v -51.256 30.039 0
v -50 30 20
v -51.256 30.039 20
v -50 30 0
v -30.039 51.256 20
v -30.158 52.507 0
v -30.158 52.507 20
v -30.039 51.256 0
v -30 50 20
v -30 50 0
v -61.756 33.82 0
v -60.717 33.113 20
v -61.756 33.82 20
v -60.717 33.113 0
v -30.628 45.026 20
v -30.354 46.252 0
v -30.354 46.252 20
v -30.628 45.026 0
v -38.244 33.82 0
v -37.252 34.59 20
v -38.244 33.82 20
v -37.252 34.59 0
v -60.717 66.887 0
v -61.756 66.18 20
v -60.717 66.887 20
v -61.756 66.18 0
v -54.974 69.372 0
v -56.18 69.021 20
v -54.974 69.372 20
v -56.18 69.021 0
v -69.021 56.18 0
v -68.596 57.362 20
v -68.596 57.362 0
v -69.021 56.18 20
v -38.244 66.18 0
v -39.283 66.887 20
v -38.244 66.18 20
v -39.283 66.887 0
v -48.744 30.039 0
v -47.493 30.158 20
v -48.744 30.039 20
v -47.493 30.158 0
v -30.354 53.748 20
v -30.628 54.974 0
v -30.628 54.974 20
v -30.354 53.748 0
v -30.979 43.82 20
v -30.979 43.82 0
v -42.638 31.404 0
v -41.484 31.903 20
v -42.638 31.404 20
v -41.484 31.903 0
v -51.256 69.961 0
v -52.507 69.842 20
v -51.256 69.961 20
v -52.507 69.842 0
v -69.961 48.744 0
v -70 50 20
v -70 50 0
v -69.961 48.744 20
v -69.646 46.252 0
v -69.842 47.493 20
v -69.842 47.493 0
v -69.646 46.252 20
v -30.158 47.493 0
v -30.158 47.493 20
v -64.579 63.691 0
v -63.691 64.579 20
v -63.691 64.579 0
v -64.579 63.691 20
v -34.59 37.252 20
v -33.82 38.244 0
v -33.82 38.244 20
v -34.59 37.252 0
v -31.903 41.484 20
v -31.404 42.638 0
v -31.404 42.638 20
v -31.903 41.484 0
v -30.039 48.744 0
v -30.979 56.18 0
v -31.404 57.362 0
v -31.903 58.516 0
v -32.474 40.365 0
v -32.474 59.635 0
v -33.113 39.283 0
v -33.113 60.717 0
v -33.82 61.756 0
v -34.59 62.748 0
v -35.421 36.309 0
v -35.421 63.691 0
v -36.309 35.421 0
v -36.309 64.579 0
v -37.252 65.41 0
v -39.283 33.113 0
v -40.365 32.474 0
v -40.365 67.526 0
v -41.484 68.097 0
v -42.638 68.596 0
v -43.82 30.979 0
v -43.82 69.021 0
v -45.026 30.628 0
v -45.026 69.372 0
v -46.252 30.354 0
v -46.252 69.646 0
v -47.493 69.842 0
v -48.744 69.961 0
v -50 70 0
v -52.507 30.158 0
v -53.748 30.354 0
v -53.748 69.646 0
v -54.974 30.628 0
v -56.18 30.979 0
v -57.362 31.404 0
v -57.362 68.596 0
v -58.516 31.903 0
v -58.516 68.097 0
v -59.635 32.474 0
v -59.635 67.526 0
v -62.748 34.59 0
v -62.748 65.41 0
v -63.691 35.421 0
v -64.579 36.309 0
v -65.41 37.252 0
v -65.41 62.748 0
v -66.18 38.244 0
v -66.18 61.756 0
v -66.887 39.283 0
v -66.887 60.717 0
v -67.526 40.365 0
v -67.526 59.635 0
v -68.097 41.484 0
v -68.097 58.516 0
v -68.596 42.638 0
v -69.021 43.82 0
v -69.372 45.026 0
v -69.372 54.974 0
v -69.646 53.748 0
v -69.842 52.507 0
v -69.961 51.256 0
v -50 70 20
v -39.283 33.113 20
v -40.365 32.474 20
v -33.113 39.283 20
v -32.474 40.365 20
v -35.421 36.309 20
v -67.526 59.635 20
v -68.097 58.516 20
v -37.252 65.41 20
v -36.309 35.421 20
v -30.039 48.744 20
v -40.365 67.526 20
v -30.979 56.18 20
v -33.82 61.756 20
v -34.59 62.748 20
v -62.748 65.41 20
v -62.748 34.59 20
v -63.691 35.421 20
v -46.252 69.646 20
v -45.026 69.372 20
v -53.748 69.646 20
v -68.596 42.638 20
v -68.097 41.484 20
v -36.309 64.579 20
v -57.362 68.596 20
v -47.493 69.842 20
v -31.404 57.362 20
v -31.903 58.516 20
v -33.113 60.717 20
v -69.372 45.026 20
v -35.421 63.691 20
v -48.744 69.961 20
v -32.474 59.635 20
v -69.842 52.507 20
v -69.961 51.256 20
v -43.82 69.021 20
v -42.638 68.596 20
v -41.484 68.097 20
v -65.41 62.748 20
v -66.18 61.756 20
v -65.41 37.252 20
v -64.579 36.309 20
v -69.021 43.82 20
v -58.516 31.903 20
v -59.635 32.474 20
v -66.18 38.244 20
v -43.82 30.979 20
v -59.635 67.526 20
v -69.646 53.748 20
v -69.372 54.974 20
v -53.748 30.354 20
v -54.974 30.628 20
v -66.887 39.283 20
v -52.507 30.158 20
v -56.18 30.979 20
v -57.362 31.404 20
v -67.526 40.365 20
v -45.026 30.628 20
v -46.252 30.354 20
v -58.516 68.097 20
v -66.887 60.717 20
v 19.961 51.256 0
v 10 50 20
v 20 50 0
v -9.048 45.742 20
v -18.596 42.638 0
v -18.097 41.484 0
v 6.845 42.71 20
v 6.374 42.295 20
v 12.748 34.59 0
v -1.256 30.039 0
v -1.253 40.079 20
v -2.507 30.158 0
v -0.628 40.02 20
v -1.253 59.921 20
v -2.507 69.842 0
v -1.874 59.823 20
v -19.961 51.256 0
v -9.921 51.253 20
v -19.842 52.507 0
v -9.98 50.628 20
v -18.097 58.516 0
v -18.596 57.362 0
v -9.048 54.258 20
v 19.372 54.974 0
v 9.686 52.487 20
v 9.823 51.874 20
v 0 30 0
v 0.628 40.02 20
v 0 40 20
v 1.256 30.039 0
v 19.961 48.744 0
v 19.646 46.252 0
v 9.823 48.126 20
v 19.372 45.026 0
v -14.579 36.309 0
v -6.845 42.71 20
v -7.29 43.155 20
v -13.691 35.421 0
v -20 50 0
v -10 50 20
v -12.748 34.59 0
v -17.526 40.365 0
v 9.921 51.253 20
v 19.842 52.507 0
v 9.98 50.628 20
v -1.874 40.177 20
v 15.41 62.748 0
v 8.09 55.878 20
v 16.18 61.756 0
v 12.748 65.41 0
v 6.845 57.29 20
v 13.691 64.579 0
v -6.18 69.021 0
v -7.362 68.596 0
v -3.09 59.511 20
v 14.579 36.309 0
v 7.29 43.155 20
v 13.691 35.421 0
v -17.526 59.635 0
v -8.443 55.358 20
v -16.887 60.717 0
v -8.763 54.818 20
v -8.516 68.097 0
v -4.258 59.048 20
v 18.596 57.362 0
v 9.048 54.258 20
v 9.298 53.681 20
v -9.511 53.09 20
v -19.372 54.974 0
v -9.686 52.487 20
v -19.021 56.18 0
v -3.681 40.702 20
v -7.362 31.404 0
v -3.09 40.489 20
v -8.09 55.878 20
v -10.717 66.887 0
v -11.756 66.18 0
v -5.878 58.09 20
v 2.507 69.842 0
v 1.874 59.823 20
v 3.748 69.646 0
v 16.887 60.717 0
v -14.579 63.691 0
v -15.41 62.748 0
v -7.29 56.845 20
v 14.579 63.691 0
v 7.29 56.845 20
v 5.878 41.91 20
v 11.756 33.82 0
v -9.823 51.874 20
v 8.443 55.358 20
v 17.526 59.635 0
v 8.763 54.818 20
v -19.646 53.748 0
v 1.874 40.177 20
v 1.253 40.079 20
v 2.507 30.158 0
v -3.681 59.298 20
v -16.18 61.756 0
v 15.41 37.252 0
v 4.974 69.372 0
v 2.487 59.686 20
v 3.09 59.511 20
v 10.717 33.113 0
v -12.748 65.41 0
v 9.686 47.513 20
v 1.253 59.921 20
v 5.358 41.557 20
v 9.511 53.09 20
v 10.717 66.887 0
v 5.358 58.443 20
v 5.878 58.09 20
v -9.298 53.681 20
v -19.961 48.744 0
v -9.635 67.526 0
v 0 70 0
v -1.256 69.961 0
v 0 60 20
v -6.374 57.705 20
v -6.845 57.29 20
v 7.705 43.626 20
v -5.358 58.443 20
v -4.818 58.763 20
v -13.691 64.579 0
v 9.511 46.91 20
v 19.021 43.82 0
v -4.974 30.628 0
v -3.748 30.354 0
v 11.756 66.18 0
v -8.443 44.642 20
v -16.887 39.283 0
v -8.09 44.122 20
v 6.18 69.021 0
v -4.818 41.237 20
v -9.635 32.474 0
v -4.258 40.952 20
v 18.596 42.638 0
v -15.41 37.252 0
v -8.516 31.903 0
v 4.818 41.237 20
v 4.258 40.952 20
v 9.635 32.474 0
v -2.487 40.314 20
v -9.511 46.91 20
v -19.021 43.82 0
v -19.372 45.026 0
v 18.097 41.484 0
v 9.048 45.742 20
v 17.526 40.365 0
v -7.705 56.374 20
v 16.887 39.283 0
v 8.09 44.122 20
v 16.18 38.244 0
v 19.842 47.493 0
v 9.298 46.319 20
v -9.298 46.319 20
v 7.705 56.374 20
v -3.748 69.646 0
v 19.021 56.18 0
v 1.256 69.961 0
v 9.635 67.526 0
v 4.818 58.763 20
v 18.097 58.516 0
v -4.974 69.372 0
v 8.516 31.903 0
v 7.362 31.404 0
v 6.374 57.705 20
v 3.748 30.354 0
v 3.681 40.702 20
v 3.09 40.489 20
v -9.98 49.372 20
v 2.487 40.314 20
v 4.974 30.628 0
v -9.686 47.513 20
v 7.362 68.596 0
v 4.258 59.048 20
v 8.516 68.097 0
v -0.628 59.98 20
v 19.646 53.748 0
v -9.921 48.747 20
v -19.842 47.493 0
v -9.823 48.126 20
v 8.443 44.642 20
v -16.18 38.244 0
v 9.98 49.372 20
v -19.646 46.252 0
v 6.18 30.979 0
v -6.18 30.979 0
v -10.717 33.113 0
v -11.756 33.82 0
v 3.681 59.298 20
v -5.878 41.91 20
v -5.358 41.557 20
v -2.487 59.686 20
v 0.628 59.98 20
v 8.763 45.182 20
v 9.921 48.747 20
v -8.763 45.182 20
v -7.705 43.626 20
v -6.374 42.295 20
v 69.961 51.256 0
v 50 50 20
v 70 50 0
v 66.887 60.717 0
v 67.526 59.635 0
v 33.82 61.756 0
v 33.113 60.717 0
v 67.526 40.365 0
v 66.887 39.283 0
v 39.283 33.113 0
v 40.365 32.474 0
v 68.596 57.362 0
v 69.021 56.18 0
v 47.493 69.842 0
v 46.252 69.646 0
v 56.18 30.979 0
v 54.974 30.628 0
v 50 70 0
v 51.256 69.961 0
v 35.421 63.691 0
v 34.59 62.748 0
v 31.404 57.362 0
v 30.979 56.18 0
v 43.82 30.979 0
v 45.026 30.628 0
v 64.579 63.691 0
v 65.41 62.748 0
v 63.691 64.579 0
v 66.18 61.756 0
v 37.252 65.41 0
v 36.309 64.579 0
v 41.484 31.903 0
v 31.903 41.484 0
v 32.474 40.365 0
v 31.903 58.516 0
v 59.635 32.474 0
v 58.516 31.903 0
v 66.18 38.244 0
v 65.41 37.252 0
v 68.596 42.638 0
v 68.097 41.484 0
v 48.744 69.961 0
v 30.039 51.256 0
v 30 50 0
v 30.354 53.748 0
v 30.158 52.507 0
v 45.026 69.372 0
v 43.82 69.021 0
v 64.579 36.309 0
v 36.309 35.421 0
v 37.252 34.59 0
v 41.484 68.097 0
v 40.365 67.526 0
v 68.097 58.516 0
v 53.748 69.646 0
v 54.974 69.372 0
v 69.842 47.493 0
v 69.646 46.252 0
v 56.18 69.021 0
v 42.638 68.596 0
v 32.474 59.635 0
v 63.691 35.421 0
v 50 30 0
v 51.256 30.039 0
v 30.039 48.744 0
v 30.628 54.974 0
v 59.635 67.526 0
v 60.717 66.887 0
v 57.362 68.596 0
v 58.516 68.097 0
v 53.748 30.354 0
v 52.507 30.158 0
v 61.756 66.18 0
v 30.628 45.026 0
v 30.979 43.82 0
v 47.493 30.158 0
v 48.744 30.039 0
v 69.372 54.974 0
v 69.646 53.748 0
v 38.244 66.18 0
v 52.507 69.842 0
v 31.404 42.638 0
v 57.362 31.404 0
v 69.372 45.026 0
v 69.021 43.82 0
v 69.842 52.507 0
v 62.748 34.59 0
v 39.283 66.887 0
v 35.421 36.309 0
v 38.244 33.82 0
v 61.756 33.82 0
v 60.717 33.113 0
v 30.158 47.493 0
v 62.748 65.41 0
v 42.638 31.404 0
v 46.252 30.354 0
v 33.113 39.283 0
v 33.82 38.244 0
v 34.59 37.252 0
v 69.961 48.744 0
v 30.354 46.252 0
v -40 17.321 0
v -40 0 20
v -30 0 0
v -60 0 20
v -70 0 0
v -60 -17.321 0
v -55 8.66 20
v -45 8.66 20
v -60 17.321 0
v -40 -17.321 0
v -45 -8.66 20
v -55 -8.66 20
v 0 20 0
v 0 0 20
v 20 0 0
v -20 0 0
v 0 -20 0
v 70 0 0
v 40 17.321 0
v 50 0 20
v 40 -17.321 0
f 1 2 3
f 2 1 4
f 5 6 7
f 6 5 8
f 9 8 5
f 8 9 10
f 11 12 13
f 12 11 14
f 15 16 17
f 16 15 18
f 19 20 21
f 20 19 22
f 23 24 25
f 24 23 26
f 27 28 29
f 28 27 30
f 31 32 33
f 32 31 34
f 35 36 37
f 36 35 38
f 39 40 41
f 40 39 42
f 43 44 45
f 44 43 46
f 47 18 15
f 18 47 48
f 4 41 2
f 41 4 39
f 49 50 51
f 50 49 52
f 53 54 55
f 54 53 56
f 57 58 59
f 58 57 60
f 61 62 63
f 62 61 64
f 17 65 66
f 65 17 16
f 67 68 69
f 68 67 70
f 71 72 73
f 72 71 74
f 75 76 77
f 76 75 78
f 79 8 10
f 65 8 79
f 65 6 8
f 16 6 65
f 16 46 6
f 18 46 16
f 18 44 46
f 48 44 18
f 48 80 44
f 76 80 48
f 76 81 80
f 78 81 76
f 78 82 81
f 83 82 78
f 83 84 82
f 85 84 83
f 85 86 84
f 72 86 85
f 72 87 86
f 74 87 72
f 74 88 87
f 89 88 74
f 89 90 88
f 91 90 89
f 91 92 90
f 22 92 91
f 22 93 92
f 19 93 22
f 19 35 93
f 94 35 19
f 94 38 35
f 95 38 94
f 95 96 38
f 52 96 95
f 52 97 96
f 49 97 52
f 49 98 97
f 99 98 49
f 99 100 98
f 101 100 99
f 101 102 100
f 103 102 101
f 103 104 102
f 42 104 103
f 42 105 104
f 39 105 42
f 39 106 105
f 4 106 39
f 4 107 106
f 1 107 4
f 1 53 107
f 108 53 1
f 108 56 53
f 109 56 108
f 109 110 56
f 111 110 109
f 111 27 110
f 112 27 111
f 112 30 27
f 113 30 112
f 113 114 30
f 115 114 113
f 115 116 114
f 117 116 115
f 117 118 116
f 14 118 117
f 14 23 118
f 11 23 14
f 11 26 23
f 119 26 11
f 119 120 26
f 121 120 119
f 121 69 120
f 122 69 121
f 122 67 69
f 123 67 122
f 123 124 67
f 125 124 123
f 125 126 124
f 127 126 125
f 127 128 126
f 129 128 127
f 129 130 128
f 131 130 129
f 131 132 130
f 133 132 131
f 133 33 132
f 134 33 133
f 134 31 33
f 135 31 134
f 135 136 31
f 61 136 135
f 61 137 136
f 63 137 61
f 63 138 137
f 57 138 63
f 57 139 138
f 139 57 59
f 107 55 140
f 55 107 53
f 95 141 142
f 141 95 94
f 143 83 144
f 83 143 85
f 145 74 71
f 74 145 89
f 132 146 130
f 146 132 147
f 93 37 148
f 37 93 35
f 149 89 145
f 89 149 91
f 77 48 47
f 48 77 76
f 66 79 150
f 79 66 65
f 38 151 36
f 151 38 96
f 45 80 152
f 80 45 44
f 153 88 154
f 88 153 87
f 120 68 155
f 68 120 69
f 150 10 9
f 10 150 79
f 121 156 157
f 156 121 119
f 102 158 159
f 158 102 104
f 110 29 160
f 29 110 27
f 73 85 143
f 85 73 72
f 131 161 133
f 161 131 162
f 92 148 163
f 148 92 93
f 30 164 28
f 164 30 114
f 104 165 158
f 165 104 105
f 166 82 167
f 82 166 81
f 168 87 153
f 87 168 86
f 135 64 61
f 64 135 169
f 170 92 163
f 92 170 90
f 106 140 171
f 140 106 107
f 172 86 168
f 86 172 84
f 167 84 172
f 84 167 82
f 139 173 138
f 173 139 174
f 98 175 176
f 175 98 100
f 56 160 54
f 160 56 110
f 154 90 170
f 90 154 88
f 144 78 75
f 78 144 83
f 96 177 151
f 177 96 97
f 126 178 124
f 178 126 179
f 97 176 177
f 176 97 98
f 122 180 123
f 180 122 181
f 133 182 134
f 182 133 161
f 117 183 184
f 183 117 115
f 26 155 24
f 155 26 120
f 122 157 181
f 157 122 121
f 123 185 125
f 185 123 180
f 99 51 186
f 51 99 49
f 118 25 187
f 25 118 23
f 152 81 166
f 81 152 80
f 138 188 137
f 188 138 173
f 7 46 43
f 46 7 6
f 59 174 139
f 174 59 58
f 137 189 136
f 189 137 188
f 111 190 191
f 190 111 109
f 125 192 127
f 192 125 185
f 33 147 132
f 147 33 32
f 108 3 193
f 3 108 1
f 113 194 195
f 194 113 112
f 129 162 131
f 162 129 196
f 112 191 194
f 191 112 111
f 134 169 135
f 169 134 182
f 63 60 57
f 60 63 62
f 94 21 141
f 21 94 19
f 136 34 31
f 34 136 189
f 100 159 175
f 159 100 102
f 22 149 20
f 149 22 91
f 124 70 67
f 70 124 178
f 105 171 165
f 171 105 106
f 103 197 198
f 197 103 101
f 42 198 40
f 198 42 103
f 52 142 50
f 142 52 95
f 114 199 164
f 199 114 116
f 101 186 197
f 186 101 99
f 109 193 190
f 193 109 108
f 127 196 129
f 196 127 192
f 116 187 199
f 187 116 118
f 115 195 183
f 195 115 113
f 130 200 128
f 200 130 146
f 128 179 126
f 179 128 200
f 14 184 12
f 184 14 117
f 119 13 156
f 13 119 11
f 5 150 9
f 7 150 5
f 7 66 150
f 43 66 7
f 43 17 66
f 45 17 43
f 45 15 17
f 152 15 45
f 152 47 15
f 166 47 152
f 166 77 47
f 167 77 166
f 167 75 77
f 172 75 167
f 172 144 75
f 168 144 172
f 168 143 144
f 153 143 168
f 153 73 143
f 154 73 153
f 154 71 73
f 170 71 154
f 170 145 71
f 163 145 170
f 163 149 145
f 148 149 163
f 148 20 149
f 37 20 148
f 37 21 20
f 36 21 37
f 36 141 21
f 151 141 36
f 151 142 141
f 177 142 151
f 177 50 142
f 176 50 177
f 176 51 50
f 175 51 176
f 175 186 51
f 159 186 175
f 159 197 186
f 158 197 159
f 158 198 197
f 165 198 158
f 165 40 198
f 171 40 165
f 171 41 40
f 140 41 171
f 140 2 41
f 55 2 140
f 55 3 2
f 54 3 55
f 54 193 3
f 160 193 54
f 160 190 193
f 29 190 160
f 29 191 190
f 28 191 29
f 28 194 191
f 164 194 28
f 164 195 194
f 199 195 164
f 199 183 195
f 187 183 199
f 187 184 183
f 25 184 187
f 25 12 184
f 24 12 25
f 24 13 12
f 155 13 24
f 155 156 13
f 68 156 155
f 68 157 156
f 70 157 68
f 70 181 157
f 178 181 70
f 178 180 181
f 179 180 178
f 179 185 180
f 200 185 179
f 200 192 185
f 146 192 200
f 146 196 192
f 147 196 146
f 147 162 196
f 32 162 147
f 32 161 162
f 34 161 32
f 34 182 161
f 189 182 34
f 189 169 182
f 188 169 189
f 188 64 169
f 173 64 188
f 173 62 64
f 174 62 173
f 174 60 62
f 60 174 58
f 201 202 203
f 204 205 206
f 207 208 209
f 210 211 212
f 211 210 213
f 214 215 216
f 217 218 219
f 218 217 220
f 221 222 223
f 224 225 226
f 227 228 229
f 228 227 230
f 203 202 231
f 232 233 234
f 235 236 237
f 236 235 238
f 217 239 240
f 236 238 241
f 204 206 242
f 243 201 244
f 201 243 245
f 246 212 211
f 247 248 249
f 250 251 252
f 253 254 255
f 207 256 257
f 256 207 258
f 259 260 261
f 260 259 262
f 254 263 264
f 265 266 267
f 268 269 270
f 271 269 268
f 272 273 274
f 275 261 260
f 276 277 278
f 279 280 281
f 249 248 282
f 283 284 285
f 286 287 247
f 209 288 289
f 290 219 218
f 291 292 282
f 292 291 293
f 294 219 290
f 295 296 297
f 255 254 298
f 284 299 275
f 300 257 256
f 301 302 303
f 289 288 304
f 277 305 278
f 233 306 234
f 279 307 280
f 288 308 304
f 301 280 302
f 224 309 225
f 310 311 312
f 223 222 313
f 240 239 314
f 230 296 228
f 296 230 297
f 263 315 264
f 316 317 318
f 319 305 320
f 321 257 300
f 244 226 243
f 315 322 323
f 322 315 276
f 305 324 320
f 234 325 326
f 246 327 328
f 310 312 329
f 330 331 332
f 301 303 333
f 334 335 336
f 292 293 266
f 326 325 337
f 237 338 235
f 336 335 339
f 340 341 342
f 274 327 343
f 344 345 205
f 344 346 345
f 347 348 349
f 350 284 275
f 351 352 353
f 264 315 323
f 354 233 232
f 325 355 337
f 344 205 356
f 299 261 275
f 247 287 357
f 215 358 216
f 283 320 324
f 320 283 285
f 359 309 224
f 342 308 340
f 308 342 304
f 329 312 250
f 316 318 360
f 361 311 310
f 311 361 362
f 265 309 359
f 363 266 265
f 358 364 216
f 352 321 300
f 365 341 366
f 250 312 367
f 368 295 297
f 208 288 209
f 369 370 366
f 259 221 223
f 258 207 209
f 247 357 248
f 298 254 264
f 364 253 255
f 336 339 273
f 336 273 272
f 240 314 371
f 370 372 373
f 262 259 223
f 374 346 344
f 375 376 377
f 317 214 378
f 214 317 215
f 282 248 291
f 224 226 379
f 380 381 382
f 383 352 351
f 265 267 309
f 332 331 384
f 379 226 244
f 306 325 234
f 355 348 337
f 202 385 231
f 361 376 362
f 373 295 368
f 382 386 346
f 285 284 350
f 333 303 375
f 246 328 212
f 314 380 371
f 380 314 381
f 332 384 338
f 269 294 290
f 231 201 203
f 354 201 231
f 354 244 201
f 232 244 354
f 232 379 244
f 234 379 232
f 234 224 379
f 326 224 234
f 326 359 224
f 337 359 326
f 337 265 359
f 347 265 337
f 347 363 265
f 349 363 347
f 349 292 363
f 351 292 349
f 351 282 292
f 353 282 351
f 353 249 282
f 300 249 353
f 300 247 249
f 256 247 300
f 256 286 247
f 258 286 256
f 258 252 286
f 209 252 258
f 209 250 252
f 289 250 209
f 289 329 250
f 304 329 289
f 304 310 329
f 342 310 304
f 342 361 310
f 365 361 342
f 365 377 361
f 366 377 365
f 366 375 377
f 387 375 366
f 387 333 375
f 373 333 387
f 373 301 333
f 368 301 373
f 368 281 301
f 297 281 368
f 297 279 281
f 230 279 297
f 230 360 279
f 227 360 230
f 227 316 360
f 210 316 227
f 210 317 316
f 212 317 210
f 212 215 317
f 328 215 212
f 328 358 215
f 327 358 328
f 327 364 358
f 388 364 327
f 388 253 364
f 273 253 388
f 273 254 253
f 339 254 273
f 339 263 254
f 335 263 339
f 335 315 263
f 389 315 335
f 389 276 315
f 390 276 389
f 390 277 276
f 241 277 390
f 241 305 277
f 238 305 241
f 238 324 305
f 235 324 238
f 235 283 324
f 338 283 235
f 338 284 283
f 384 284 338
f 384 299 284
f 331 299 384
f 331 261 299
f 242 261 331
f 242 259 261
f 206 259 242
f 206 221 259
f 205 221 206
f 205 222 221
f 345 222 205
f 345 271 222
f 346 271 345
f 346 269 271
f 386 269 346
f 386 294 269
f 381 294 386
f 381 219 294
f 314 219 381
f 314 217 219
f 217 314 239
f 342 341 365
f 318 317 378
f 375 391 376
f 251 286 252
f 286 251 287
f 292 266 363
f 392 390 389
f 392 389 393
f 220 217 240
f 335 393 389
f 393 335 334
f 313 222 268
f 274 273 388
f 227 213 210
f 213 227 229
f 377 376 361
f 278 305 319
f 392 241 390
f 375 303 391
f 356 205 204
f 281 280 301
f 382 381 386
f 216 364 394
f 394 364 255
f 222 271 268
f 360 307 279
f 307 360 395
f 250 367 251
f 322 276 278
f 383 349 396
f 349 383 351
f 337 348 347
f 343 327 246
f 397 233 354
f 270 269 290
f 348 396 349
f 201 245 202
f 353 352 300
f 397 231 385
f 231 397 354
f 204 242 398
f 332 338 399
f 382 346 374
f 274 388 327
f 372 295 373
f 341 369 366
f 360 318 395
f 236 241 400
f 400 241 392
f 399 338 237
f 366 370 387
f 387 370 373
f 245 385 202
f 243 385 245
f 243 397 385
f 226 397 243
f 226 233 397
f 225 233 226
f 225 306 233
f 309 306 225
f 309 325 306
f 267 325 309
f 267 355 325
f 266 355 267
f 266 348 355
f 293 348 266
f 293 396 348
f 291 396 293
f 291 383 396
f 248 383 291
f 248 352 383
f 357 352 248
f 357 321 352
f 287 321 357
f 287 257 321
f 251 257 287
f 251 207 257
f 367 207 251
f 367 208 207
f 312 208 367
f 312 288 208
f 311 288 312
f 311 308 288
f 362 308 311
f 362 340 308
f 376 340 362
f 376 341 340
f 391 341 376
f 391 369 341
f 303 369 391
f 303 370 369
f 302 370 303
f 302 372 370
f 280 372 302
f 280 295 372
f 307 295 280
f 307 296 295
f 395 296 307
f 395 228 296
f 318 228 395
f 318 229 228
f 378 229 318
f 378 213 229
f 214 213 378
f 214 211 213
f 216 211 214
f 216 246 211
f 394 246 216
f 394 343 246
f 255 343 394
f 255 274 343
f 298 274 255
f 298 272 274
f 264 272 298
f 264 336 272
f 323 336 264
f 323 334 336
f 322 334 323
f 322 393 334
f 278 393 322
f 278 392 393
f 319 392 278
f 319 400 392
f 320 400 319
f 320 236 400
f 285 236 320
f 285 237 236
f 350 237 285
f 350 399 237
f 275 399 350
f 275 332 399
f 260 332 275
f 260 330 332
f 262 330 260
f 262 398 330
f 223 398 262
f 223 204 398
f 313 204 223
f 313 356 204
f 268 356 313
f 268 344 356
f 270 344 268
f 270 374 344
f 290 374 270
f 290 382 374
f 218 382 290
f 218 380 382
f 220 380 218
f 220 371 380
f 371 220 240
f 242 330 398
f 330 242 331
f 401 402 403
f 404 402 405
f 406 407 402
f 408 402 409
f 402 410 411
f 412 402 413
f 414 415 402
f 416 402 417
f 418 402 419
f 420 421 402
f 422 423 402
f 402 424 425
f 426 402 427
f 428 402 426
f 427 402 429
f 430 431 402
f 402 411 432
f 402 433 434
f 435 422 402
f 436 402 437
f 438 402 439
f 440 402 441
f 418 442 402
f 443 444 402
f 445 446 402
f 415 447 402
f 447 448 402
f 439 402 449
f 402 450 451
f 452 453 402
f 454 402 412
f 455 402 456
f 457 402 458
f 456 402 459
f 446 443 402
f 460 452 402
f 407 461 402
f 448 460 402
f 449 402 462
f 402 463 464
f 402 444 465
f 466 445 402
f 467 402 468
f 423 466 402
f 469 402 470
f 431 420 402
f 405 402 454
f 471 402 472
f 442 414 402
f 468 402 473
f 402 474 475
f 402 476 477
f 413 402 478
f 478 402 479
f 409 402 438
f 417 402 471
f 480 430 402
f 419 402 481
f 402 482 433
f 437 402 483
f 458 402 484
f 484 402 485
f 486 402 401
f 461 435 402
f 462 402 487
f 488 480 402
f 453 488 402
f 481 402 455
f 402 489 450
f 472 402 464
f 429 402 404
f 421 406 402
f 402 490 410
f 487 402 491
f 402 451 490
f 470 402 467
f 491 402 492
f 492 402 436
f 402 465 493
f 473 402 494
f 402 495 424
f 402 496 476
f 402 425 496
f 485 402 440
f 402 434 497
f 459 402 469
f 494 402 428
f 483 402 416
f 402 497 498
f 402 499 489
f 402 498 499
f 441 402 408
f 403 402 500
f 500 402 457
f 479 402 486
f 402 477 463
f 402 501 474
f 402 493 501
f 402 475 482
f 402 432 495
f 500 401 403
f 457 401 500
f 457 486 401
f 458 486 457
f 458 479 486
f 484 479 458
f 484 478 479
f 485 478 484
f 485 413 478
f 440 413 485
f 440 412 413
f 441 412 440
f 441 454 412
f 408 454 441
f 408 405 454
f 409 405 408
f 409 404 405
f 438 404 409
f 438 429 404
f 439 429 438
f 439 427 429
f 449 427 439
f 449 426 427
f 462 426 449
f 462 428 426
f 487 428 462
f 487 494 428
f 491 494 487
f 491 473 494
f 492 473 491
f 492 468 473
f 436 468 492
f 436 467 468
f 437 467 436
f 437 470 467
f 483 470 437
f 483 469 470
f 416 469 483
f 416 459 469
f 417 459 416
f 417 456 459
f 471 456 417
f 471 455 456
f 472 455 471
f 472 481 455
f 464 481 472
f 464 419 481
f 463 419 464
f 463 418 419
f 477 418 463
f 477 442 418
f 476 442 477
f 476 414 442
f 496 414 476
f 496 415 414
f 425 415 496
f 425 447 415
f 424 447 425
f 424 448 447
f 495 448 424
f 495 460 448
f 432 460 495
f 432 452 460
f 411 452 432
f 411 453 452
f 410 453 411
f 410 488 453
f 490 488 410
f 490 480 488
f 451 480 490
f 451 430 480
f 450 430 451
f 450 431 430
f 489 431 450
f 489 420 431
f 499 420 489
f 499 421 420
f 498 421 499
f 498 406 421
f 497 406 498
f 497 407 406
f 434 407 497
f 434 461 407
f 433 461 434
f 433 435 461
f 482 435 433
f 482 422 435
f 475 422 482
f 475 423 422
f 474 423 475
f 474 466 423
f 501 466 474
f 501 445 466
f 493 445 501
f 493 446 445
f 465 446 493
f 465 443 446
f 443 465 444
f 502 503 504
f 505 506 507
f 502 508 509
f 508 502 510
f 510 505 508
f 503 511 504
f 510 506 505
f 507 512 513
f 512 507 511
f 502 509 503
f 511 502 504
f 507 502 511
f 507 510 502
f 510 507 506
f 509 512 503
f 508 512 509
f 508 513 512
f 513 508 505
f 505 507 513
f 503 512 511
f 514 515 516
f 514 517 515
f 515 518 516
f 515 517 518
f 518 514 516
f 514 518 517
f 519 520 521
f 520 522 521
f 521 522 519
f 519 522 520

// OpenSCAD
d = 50;

//-- Cilindro normal. r es el radio, h es la altura
translate([-d, d, 0])
  cylinder (r = 20, h = 20, $fn = 100);

//-- Cono truncado. r1 radio base inferior, r2 radio de la base superior
translate([0, d, 0])
 cylinder (r1 = 20, r2 = 10, h = 20, $fn = 100);

//-- Cono
translate([d, d, 0])
  cylinder (r1 = 20, r2 = 0, h = 20, $fn = 100);

//-- Piramide truncada de base hexagonal
translate([-d, 0, 0])
  cylinder (r1 = 20, r2 = 10, h = 20, $fn = 6);

//-- Piramide
translate([0, 0, 0])
  cylinder (r1 = 20, r2 = 0, h = 20, $fn = 4);

//-- Tetraedro
translate([d, 0, 0])
  cylinder (r1 = 20, r2 = 0, h = 20, $fn = 3);
